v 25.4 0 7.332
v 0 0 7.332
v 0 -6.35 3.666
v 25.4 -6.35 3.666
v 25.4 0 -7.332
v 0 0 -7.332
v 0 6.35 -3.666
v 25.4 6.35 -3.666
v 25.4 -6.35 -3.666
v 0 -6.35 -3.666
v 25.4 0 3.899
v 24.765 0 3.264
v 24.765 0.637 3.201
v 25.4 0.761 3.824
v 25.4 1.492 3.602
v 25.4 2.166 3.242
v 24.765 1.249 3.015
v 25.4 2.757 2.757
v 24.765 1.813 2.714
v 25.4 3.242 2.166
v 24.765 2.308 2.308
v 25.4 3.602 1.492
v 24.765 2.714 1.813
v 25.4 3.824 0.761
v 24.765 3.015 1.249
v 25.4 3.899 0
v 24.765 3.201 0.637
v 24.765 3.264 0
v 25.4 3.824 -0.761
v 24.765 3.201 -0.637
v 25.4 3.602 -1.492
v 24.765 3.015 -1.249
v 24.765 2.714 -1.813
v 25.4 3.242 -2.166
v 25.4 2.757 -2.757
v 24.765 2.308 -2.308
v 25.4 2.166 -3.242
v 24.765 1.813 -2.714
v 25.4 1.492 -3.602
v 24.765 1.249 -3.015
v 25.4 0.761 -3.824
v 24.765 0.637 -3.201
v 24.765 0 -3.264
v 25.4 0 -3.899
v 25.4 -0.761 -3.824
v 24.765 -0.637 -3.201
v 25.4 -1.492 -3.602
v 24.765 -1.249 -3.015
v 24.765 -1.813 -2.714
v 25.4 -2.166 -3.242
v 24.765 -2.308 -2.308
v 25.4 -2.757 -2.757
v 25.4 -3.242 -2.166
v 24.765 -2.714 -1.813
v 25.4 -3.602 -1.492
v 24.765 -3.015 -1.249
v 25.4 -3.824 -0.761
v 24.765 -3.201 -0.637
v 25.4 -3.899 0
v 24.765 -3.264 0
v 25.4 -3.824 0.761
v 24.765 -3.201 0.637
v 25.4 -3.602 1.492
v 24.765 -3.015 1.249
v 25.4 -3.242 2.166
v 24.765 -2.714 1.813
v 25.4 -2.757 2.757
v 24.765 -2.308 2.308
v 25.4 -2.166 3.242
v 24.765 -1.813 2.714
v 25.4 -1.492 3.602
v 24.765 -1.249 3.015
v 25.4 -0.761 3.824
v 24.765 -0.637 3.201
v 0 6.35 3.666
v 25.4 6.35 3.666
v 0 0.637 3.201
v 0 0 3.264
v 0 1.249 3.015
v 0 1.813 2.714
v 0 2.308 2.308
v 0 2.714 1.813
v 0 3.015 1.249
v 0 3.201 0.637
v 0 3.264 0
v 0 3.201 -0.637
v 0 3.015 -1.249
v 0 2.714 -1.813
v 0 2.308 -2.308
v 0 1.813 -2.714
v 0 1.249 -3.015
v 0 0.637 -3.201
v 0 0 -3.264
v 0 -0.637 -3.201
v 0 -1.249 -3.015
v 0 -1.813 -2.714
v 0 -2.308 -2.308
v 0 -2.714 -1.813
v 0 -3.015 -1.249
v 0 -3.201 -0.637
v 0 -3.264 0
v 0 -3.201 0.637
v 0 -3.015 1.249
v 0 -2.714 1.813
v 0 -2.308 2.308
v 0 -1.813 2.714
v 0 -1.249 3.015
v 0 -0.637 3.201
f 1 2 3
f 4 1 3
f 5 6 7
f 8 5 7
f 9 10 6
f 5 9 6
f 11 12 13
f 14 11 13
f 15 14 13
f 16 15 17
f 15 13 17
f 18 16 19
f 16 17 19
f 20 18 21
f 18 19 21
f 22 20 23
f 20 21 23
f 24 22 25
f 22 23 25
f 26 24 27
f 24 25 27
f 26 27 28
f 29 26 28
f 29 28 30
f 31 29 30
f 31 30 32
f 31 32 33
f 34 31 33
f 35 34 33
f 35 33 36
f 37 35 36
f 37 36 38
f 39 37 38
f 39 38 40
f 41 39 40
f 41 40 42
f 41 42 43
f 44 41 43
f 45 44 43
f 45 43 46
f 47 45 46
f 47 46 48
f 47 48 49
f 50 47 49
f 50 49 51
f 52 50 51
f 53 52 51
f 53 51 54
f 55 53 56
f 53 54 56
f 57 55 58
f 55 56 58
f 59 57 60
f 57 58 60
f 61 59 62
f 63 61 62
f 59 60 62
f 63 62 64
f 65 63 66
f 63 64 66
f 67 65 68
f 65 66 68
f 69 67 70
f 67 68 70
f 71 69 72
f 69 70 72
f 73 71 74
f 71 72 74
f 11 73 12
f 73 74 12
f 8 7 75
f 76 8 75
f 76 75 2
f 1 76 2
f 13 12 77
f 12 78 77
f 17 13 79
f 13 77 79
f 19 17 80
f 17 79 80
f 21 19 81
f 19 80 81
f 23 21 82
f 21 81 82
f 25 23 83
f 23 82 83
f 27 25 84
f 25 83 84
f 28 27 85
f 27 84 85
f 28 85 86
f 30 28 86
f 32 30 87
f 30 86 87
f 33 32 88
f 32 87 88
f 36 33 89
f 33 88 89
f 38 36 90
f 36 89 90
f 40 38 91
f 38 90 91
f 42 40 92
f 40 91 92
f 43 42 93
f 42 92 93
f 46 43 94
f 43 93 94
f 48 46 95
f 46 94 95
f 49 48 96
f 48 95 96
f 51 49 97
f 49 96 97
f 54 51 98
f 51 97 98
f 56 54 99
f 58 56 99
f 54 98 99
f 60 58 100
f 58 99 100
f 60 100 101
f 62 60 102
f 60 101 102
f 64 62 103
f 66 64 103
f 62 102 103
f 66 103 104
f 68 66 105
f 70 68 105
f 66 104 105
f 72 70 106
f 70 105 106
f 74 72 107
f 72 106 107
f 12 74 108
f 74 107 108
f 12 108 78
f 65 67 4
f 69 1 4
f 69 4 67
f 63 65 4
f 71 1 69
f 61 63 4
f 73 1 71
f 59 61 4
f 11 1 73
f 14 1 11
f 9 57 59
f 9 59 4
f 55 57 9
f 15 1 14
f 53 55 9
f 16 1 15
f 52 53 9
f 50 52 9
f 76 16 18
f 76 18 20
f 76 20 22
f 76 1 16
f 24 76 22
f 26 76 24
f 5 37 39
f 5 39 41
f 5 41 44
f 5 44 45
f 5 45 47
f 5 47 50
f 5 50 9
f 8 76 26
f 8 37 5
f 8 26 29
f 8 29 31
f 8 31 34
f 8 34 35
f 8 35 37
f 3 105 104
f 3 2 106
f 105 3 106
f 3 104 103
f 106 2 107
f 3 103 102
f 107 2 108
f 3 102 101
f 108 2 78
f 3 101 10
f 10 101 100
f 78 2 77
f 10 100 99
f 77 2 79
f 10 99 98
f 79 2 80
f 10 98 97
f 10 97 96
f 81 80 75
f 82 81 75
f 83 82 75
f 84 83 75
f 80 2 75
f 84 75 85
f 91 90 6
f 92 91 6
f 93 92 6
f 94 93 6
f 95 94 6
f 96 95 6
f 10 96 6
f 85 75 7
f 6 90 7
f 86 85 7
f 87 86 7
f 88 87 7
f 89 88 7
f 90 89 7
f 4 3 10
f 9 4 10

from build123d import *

# Parameters (mm, degrees)
BOSS_EXTRUDE1_DEPTH                    = 25.4
TAP_DRILL_FOR_5_16_18_TAP1_D           = 6.5278
TAP_DRILL_FOR_5_16_18_TAP1_CSINK_D     = 7.7978
TAP_DRILL_FOR_5_16_18_TAP1_CSINK_ANGLE = 90


with BuildPart() as part:
    # Sketch1 → Boss-Extrude1 (new body)
    with BuildSketch(Plane(origin=(0, 0, 0), x_dir=(0, 0, -1), z_dir=(1, 0, 0))):
        Polygon((7.332348419, 0), (3.666174209, 6.35), (-3.666174209, 6.35), (-7.332348419, 0), (-3.666174209, -6.35), (3.666174209, -6.35), align=None)
    extrude(amount=BOSS_EXTRUDE1_DEPTH)

    # Tap Drill for 5/16-18 Tap1 (through all)
    with Locations(Plane(origin=(25.4, 0, 0), x_dir=(0, 0, -1), z_dir=(1, 0, 0))):
        with Locations((0, 0)):
            CounterSinkHole(TAP_DRILL_FOR_5_16_18_TAP1_D / 2, TAP_DRILL_FOR_5_16_18_TAP1_CSINK_D / 2, counter_sink_angle=TAP_DRILL_FOR_5_16_18_TAP1_CSINK_ANGLE)


solid = part.part
